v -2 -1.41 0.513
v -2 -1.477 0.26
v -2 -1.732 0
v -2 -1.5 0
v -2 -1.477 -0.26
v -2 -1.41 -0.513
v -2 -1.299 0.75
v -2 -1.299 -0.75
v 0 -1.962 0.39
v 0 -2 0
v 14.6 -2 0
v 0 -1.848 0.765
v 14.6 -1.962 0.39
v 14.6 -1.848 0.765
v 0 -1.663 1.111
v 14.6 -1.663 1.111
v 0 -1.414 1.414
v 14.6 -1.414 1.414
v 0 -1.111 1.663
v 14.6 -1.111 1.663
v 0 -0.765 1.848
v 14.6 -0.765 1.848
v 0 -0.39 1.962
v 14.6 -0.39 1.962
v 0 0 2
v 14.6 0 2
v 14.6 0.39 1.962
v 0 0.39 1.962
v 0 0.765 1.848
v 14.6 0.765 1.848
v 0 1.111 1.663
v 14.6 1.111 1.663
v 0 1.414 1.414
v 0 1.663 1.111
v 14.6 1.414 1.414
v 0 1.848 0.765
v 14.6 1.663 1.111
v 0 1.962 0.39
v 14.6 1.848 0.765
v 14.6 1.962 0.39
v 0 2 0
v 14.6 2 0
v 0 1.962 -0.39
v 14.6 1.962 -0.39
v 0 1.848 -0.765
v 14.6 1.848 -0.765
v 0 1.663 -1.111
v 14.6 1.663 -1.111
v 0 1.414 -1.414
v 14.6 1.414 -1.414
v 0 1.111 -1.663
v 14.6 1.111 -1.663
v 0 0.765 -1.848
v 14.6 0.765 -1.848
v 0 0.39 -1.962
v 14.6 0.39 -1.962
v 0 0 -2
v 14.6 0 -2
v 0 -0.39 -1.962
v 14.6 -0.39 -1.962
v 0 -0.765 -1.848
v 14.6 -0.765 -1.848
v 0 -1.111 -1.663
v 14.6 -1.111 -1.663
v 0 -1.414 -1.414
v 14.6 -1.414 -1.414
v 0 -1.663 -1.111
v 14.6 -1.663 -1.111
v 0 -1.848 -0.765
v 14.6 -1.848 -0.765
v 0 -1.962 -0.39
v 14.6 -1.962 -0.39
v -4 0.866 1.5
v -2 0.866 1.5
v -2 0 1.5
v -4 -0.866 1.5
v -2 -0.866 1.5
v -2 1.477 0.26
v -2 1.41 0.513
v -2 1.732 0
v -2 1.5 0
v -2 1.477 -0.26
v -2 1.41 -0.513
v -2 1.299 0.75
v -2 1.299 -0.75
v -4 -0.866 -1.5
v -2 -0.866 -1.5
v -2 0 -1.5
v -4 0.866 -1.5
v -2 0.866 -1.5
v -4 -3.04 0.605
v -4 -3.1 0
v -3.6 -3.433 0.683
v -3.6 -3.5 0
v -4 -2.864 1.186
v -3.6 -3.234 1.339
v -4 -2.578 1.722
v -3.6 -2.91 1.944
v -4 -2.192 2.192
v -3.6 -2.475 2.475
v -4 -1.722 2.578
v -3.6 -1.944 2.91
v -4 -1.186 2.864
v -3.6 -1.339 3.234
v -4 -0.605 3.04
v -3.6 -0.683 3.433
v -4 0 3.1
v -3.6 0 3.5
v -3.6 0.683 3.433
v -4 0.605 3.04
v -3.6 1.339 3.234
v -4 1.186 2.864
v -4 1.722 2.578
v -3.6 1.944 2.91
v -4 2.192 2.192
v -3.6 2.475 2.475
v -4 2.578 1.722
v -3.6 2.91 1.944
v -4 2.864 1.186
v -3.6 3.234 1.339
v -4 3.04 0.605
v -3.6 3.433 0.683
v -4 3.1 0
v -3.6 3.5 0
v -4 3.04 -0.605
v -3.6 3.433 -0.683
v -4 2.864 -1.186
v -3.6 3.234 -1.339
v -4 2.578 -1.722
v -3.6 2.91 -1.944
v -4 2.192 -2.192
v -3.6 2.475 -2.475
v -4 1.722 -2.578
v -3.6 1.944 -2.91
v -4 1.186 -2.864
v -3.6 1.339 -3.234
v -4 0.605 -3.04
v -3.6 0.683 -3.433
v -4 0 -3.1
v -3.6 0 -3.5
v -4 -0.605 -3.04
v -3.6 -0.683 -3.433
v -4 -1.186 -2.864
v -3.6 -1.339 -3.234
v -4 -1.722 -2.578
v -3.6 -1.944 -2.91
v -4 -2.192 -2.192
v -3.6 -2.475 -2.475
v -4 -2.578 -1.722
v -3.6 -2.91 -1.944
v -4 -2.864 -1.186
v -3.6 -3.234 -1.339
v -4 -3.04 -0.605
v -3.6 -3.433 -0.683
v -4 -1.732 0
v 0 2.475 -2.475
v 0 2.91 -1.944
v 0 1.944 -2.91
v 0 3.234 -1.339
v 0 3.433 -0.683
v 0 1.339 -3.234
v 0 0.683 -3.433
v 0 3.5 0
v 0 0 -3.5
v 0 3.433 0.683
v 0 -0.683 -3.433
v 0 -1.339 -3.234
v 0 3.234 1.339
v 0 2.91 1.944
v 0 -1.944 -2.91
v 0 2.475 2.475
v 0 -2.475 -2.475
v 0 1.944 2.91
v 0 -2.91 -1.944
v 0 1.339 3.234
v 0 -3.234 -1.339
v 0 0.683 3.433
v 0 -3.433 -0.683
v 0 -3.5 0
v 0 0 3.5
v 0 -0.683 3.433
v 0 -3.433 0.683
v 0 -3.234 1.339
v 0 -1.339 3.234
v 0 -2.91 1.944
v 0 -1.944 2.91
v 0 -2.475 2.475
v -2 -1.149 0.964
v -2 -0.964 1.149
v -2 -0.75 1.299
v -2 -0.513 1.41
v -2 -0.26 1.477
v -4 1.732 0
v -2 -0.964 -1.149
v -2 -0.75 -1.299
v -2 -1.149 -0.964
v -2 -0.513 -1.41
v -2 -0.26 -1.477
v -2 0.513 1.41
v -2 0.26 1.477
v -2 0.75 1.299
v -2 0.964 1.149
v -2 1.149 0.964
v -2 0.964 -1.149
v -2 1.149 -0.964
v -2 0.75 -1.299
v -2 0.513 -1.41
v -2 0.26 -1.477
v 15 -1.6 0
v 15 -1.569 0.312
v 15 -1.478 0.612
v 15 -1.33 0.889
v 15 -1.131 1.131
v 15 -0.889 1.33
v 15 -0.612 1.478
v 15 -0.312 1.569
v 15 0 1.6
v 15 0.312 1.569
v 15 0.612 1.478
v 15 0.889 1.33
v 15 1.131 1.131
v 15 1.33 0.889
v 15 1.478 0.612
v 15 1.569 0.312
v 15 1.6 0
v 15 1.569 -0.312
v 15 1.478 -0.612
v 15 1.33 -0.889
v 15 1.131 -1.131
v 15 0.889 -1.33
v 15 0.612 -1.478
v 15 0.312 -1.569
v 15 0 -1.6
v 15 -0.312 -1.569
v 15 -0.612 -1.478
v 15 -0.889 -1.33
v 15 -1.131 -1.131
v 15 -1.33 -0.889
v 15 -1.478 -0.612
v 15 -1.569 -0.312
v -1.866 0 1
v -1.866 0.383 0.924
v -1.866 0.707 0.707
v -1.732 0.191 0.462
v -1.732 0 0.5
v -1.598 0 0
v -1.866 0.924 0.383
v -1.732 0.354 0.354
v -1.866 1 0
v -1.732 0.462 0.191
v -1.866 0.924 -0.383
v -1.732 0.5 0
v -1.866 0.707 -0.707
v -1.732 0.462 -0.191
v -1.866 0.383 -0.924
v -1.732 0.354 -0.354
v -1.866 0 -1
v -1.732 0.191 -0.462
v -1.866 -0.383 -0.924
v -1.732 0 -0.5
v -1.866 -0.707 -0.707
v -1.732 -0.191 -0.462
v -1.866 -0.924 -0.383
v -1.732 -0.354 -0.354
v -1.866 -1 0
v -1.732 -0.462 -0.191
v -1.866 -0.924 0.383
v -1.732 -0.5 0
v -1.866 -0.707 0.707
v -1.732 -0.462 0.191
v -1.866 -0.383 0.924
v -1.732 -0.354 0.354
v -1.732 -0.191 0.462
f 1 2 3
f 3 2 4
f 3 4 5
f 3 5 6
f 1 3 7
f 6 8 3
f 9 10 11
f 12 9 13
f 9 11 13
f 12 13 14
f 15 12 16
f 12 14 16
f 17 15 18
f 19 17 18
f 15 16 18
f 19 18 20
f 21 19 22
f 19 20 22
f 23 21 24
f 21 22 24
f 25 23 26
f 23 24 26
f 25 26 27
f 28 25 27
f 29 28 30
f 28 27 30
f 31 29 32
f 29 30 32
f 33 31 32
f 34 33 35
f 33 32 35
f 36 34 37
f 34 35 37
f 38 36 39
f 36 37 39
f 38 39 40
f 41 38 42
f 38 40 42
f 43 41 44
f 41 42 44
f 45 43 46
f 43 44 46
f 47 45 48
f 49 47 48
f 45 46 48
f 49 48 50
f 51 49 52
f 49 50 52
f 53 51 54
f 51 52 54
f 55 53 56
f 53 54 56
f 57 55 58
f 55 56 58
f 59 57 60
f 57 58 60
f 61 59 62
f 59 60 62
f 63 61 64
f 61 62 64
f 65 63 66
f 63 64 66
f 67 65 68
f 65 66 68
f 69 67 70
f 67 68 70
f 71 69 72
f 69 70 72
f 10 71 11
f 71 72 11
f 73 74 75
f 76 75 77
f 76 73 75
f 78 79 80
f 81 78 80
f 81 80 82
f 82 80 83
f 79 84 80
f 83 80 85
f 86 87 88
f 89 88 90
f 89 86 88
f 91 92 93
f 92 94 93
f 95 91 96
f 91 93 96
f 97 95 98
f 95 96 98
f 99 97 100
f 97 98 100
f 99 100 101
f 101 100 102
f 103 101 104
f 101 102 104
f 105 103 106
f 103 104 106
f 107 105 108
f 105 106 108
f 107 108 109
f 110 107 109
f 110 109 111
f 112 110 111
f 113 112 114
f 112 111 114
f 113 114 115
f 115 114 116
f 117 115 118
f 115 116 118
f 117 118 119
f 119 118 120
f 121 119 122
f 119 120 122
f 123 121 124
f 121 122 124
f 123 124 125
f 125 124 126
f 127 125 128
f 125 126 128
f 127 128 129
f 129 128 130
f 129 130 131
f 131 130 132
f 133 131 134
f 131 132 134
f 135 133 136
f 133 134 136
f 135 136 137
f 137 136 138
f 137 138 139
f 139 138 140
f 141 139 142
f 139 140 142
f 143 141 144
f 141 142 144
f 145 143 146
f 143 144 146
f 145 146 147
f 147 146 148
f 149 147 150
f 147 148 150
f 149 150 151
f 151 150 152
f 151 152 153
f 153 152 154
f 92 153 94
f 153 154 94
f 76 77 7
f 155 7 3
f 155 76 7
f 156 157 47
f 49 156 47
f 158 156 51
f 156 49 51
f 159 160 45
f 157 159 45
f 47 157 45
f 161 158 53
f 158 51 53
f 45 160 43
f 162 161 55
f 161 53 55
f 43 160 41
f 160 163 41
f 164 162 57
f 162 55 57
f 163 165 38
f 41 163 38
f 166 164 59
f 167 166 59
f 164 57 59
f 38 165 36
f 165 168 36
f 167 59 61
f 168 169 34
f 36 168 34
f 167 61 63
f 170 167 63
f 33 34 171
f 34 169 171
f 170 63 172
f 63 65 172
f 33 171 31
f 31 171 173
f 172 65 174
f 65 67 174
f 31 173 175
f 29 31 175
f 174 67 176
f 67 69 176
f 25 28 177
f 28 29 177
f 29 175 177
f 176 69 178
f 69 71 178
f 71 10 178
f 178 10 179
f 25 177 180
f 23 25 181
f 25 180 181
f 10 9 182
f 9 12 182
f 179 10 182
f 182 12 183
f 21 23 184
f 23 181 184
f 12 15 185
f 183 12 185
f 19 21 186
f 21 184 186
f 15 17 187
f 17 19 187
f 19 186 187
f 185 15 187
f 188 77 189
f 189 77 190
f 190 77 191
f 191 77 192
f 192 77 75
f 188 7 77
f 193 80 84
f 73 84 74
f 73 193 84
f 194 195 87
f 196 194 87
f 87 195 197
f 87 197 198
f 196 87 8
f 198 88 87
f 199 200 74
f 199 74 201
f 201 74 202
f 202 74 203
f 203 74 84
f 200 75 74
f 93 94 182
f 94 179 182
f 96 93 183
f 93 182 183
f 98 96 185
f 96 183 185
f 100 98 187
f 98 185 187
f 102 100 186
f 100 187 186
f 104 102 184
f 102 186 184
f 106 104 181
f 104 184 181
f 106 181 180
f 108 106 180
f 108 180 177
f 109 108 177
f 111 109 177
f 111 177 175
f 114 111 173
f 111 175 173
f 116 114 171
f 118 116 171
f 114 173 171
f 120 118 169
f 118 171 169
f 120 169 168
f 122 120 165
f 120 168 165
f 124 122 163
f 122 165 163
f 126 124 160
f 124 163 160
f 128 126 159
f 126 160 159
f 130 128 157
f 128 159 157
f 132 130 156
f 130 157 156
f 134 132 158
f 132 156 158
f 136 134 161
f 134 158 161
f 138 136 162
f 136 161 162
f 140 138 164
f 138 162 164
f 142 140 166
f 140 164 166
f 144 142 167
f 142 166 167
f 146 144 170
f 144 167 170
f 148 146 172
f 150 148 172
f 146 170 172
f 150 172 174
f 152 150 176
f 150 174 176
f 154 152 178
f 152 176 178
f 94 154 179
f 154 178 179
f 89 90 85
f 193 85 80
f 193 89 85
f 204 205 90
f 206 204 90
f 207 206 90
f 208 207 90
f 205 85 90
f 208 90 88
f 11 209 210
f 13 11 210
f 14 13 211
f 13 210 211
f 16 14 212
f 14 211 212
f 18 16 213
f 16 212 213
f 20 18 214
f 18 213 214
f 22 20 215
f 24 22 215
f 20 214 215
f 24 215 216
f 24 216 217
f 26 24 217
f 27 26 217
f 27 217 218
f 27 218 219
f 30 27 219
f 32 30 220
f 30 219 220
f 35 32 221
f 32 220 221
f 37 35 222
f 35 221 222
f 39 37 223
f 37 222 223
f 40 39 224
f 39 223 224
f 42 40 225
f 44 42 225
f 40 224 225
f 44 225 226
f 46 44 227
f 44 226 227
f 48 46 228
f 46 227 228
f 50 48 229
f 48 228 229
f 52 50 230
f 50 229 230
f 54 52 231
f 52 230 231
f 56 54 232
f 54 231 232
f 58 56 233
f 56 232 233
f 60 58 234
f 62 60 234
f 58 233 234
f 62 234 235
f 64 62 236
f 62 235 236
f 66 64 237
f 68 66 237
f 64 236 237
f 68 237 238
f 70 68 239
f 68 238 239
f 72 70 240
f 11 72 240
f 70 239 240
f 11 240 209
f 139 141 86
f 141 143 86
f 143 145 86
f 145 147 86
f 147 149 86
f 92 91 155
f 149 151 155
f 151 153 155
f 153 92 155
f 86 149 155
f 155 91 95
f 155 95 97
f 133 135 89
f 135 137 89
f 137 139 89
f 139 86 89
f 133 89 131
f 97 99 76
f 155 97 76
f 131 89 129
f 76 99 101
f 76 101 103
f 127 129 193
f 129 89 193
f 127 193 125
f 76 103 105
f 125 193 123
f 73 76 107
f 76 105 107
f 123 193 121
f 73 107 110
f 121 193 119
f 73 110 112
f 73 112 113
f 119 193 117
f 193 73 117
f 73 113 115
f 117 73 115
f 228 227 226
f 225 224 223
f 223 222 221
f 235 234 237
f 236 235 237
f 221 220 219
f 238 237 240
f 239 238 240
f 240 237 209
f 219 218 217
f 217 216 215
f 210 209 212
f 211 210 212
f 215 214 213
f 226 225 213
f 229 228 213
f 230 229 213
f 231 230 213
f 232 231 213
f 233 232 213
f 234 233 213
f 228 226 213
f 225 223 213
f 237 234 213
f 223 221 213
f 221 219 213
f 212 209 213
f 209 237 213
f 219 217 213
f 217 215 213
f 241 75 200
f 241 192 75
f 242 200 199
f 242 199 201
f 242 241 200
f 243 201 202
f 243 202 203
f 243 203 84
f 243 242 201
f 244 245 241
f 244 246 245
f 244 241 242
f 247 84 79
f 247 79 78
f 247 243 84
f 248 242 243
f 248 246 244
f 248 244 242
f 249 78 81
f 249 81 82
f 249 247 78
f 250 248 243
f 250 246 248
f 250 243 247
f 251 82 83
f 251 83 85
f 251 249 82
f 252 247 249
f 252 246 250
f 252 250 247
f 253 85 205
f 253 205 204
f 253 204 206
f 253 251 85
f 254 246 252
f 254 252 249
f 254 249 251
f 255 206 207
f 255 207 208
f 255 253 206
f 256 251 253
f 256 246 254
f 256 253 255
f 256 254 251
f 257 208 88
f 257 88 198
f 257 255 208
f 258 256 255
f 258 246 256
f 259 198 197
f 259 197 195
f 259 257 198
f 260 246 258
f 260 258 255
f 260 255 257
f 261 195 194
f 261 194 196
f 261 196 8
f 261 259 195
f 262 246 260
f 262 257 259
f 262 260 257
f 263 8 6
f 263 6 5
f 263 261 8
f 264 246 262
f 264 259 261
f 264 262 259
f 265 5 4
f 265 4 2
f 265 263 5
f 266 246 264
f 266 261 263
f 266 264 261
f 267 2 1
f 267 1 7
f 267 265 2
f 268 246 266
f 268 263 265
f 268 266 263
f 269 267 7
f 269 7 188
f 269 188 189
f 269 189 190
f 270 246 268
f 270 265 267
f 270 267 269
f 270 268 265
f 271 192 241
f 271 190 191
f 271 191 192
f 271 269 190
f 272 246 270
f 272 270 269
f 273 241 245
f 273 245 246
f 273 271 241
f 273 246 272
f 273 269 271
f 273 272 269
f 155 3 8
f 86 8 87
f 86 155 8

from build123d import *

# Parameters (mm, degrees)
CHAMFER1_SIZE      = 0.4
CUT_EXTRUDE1_DEPTH = 2


with BuildPart() as part:
    # Sketch1 → Revolve1 (revolve)
    with BuildSketch(Plane.XY, mode=Mode.PRIVATE) as revolve1_sk:
        Polygon((-4, 0), (-4, 3.1), (-3.6, 3.5), (0, 3.5), (0, 2), (15, 2), (15, 0), align=None)
    revolve(revolve1_sk.sketch.rotate(Axis((15, 0, 0), (-1, 0, 0)), 180), axis=Axis((15, 0, 0), (-1, 0, 0)))

    # Chamfer1
    chamfer1_edges = [part.edges().sort_by_distance(p)[0] for p in [
        (15, 2, 0),
    ]]
    chamfer(chamfer1_edges, length=CHAMFER1_SIZE)

    # Sketch2 → Cut-Revolve1 (revolve, cut)
    with BuildSketch(Plane.XY, mode=Mode.PRIVATE) as cut_revolve1_sk:
        Polygon((-4, 0), (-4, 1.5), (-2, 1.5), (-1.598076211, 0), align=None)
    revolve(cut_revolve1_sk.sketch.rotate(Axis((-1.598076211, 0, 0), (-1, 0, 0)), 270), axis=Axis((-1.598076211, 0, 0), (-1, 0, 0)), mode=Mode.SUBTRACT)

    # Sketch3 → Cut-Extrude1 (cut)
    with BuildSketch(Plane(origin=(-4, 0, 0), x_dir=(0, 0, -1), z_dir=(1, 0, 0))):
        Polygon((-1.5, 0.866025404), (-1.5, -0.866025404), (0, -1.732050808), (1.5, -0.866025404), (1.5, 0.866025404), (0, 1.732050808), align=None)
    extrude(amount=CUT_EXTRUDE1_DEPTH, mode=Mode.SUBTRACT)


solid = part.part
